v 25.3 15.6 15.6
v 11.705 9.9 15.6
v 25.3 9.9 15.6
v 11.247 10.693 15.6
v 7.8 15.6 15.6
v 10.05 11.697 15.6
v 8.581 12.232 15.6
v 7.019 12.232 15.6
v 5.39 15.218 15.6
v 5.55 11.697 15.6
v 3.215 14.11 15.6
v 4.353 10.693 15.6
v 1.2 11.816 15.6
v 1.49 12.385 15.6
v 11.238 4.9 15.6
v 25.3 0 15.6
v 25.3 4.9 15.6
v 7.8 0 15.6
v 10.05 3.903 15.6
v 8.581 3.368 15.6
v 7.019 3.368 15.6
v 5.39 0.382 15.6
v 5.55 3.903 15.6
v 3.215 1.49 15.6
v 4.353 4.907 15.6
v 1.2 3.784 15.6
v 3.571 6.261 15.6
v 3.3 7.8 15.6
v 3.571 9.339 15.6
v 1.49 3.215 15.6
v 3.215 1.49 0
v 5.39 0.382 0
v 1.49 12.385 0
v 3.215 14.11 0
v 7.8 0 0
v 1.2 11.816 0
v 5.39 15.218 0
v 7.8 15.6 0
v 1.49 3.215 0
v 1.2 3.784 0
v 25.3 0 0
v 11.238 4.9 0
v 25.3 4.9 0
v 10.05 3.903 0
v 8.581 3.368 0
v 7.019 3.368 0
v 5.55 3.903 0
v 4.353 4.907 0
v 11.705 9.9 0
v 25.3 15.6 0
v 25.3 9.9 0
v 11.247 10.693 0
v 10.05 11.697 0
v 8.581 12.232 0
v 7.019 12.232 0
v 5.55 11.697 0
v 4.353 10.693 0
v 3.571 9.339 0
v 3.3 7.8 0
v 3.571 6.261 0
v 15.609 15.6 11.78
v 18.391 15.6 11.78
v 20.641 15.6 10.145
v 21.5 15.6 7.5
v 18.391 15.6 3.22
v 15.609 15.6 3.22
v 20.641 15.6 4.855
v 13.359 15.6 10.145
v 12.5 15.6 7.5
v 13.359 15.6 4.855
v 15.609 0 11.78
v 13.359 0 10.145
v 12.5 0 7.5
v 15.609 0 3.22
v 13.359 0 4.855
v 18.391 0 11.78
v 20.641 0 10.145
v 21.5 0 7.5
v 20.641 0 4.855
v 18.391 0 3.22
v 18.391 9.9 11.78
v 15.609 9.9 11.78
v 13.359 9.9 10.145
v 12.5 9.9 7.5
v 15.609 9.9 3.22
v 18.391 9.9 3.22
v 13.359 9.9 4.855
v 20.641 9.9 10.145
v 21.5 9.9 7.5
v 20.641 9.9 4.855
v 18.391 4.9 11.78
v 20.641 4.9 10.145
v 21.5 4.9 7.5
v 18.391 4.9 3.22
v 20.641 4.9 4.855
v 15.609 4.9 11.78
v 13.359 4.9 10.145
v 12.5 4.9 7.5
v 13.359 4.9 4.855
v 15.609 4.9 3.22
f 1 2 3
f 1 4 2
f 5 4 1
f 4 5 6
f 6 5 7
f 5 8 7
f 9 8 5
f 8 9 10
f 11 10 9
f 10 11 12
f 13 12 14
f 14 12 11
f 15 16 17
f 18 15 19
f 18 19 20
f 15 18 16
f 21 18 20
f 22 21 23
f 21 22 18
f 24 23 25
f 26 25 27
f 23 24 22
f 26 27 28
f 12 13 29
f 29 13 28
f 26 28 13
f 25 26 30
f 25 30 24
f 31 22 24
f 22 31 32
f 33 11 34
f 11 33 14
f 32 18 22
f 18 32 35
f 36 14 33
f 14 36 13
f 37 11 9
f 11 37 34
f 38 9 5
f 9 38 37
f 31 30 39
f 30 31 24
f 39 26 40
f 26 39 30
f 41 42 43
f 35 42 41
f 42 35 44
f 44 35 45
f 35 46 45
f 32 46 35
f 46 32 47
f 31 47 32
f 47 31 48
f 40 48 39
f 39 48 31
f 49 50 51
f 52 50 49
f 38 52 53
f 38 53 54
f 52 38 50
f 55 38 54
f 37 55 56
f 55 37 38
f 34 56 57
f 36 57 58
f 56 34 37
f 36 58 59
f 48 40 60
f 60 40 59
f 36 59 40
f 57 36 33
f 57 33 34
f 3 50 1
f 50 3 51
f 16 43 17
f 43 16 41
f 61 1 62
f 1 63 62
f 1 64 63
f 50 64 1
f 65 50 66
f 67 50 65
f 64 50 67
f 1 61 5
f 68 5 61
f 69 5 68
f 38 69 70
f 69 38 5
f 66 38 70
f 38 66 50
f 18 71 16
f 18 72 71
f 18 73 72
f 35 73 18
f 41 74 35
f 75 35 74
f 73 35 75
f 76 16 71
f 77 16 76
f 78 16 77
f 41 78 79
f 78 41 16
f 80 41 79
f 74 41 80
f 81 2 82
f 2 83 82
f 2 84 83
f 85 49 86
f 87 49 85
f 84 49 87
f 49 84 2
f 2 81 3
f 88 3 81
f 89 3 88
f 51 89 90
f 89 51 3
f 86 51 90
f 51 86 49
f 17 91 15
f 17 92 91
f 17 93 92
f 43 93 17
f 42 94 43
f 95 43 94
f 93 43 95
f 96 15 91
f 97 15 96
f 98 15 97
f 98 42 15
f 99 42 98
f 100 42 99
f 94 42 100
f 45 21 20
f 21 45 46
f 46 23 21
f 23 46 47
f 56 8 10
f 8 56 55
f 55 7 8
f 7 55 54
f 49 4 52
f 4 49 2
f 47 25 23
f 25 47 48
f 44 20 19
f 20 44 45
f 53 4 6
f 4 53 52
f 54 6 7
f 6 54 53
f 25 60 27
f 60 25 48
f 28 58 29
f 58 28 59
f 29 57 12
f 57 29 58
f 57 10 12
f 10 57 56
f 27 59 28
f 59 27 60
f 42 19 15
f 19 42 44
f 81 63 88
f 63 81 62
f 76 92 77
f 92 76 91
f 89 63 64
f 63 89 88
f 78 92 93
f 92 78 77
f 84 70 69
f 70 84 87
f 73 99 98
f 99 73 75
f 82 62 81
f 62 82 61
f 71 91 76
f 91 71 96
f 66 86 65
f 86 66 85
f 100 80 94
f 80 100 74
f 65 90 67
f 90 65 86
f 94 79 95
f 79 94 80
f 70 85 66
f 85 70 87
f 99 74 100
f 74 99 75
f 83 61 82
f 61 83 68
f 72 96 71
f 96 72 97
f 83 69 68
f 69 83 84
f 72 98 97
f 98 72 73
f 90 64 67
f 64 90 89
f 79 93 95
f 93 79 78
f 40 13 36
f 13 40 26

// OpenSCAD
// file: configuration.scad
// PRUSA Mendel  
// Configuration file
// GNU GPL v2
// Josef Průša
// josefprusa@me.com
// prusadjs.cz
// http://www.reprap.org/wiki/Prusa_Mendel
// http://github.com/prusajr/PrusaMendel

// PLEASE SELECT ONE OF THE CONFIGURATIONS BELOW
// BY UN-COMMENTING IT

variant=0; //0 for metric
//variant=1; //1 for SAE
if(variant==0){
echo("variant: metric");
}else if(variant==1){
echo("variant: sae");
} else{
echo("WARNING: INVALID CONFIGURATION");
}


vars=[
//[m8_dia, m8_nut, m4_dia, m4_nut, m3_dia, m3_nut, bush_dia, mot_shaft, bush_rod, bush_outerdia, bush_length]
[9,16.4,5,9,4.4,7,11,5.3,8,16,11],//metric
[9,15.7,5.5,10.6,5.5,10.6,11.5,5.3,7.9375,16,11]//SAE
];

//BUSHING TYPE Can generate three versions
// 1 - regular old ones
// 2 - helical ones
// 3 - holders for brass or any other bought bushings
bushing_type = 3;

//Round corner diameter
round_corner_diameter = 8;

//Thin wall size
layer_height = 0.4;
perimeter_width_over_thicknes = 1.6;
infill_widht_over_thickness = 1.55;
thin_wall = 2*(perimeter_width_over_thicknes*layer_height+infill_widht_over_thickness*layer_height);
if(thin_wall<2){
	echo("Check thin wall size, its below 2mm!");
}
echo(thin_wall);

//DO NOT TOUCH THIS SECTION!
m8_diameter = vars[variant][0];
m8_nut_diameter = vars[variant][1];
m4_diameter = vars[variant][2];
m4_nut_diameter = vars[variant][3];
m3_diameter = vars[variant][4];
m3_nut_diameter = vars[variant][5];
bushing_diameter = vars[variant][6];
motor_shaft=vars[variant][7];
bushing_rodsize = vars[variant][8];
bushing_outerDiameter = vars[variant][9];
bushing_lenght = vars[variant][10];


// MINI-HUXLEY VERSION (TODO, just place holder)
// include <configuration-huxley.scad>

// MEGA VERSION (TODO, just place holder)
// include <configuration-mega.scad>


// Some basic functions, probably should be somewhere else
module roundcorner(diameter){
	difference(){
		cube(size = [diameter,diameter,99], center = false);
		translate(v = [diameter, diameter, 0]) cylinder(h = 100, r=diameter, center=true);
	}
}
// main file
/*Modified Bar clamp based on Prusa

// PRUSA Mendel  
// Bar clamp
// Used for joining 8mm rods
// GNU GPL v2
// Josef Průša
// josefprusa@me.com
// prusadjs.cz
// http://www.reprap.org/wiki/Prusa_Mendel
// http://github.com/prusajr/PrusaMendel

*/
include <configuration.scad>



module barclamp(){
outer_diameter = m8_diameter/2+3.3;

difference(){
	union(){
		
		translate([outer_diameter, outer_diameter, 0])cylinder(h =outer_diameter*2, r = outer_diameter, $fn = 20);
		translate([outer_diameter, 0, 0])cube([17.5,outer_diameter*2,outer_diameter*2]);
	}


	translate([9, outer_diameter/2+1, 0])cube([18,05,20]);
	translate([outer_diameter, outer_diameter, 0]) #cylinder(h =20, r = m8_diameter/2, $fn = 18);
	translate([17, 17, 7.5]) rotate([90, 0, 0]) #cylinder(h =20, r = m8_diameter/2, $fn = 10);
	translate([0,0,-1])cube([1.2,outer_diameter*2,(outer_diameter*2)+2]);
}
}
barclamp();
